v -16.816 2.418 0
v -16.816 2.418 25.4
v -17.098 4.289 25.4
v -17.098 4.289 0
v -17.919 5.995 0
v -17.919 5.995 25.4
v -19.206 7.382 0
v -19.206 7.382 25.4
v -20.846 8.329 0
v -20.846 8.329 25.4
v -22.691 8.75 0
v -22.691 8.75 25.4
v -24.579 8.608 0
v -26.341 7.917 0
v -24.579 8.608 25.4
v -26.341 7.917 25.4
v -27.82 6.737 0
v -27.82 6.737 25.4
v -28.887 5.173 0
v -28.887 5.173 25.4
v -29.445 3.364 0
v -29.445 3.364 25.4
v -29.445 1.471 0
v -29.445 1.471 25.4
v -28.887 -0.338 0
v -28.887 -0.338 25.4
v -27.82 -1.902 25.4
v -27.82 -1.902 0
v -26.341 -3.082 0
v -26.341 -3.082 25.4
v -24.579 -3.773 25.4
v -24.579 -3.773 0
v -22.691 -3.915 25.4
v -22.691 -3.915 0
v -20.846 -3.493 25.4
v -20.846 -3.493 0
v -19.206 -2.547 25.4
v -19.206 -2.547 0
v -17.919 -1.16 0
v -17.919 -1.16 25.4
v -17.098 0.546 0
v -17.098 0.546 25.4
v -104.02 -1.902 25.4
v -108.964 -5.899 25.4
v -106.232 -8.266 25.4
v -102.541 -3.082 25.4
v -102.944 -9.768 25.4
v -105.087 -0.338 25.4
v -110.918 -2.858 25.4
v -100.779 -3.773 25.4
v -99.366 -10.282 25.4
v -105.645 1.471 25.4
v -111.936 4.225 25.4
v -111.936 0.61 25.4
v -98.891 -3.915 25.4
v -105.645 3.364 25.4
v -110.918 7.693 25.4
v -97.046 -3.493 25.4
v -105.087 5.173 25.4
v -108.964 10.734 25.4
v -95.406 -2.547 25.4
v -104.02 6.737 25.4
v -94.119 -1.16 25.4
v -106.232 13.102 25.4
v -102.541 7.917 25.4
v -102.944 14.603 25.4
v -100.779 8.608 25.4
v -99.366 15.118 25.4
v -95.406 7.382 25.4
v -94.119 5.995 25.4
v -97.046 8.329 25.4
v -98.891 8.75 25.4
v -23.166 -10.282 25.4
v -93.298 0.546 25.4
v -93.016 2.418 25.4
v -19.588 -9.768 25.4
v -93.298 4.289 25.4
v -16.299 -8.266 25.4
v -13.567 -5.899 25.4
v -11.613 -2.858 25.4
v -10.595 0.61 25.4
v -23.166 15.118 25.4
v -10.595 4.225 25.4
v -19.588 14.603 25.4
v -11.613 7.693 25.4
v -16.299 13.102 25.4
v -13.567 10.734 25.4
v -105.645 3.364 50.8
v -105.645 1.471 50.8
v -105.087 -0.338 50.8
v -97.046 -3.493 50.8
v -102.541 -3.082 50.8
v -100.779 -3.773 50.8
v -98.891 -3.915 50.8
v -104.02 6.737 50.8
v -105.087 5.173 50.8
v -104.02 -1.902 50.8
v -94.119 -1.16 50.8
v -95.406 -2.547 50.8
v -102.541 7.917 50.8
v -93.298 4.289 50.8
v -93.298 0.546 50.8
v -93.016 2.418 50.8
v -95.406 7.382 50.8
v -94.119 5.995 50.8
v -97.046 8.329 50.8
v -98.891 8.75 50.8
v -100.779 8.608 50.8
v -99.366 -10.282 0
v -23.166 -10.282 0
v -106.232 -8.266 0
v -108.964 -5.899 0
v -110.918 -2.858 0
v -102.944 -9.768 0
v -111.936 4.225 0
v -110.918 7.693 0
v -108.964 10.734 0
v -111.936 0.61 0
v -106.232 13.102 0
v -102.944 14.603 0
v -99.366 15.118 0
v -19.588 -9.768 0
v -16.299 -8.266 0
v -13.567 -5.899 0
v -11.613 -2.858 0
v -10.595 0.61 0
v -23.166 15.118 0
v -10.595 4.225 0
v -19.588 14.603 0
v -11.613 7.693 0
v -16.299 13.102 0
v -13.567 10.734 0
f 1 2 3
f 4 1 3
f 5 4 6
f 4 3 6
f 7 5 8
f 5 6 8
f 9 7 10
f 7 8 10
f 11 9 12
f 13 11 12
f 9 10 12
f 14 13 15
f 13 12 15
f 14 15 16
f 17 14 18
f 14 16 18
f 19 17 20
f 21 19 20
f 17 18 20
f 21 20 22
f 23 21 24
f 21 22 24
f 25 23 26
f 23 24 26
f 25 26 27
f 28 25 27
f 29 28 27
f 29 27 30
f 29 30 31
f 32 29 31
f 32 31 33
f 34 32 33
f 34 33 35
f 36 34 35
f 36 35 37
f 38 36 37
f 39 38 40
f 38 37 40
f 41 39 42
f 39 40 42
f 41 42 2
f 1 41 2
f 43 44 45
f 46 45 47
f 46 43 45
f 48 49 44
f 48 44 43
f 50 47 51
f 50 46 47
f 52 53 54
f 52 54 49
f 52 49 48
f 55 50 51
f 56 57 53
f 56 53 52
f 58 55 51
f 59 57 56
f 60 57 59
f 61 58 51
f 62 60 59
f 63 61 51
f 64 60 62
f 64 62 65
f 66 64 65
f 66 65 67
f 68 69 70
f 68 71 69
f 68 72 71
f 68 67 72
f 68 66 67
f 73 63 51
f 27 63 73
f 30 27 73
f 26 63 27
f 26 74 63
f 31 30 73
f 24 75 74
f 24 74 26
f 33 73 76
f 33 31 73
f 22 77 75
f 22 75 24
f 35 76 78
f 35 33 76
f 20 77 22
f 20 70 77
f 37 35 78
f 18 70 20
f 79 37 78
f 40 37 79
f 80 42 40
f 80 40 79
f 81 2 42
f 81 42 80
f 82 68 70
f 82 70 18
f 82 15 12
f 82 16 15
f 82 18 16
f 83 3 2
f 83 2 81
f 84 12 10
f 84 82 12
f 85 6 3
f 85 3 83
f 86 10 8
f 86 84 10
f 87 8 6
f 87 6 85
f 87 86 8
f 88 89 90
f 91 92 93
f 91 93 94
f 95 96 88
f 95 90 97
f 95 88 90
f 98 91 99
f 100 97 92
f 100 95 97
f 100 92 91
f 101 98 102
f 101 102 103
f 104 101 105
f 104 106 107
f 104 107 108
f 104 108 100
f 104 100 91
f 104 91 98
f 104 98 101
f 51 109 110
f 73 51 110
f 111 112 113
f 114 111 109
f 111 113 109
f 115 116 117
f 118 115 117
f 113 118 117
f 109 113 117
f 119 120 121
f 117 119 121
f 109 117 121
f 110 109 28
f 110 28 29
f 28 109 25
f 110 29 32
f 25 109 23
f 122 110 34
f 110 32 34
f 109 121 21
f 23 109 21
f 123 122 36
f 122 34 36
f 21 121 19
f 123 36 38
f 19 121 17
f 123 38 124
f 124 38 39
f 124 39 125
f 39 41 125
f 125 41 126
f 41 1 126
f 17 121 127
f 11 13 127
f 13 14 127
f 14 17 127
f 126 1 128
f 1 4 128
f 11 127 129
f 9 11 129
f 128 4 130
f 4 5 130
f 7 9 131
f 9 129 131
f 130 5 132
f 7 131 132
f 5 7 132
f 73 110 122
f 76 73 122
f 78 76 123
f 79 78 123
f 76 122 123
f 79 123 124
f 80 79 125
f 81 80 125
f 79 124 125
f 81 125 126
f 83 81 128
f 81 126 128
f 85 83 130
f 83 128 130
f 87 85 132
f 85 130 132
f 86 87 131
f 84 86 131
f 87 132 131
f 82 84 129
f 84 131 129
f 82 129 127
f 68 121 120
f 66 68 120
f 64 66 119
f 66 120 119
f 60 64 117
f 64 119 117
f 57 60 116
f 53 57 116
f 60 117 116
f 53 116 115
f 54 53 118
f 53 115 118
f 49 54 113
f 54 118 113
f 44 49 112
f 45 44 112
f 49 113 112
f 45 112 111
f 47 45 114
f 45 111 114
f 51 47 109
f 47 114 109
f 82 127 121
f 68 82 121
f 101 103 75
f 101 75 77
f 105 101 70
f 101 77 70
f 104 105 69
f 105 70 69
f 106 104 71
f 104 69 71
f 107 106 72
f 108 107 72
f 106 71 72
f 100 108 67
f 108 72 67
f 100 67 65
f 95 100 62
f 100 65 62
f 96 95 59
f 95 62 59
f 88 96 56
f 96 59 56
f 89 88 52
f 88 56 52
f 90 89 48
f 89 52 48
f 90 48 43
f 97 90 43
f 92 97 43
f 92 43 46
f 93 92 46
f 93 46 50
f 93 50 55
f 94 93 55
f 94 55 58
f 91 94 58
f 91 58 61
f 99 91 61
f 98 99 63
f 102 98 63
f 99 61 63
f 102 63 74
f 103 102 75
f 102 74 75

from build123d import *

# Parameters (mm, degrees)
F2_DEPTH = 25.4
F3_R     = 6.35
F4_DEPTH = 25.4
F5_DEPTH = 25.4


# Not quite as in the source:
# - a variable given as a bare number and used for a length is read in inches; the dataset says mm whatever the document's units were


with BuildPart() as f2:
    # F1 (on Top) → F2 (new body)
    with BuildSketch(Plane.XY):
        with BuildLine():
            ThreePointArc((-23.1655191958, -10.2824198201), (-10.4655191958, 2.4175801799), (-23.1655191958, 15.1175801799))
            Line((-23.1655191958, 15.1175801799), (-99.3655191958, 15.1175801799))
            ThreePointArc((-99.3655191958, 15.1175801799), (-112.0655191958, 2.4175801799), (-99.3655191958, -10.2824198201))
            Line((-99.3655191958, -10.2824198201), (-23.1655191958, -10.2824198201))
        make_face()
    extrude(amount=F2_DEPTH)

    # F3 (on face) → F4 (join)
    with BuildSketch(Plane.XY.offset(25.4)):
        with Locations((-99.3655191958, 2.4175801799)):
            Circle(F3_R)
    extrude(amount=F4_DEPTH)

    # F3 (on face) → F5 (cut)
    with BuildSketch(Plane.XY.offset(25.4)):
        with Locations((-23.1655191958, 2.4175801799)):
            Circle(F3_R)
    extrude(amount=-F5_DEPTH, mode=Mode.SUBTRACT)


solid = f2.part
